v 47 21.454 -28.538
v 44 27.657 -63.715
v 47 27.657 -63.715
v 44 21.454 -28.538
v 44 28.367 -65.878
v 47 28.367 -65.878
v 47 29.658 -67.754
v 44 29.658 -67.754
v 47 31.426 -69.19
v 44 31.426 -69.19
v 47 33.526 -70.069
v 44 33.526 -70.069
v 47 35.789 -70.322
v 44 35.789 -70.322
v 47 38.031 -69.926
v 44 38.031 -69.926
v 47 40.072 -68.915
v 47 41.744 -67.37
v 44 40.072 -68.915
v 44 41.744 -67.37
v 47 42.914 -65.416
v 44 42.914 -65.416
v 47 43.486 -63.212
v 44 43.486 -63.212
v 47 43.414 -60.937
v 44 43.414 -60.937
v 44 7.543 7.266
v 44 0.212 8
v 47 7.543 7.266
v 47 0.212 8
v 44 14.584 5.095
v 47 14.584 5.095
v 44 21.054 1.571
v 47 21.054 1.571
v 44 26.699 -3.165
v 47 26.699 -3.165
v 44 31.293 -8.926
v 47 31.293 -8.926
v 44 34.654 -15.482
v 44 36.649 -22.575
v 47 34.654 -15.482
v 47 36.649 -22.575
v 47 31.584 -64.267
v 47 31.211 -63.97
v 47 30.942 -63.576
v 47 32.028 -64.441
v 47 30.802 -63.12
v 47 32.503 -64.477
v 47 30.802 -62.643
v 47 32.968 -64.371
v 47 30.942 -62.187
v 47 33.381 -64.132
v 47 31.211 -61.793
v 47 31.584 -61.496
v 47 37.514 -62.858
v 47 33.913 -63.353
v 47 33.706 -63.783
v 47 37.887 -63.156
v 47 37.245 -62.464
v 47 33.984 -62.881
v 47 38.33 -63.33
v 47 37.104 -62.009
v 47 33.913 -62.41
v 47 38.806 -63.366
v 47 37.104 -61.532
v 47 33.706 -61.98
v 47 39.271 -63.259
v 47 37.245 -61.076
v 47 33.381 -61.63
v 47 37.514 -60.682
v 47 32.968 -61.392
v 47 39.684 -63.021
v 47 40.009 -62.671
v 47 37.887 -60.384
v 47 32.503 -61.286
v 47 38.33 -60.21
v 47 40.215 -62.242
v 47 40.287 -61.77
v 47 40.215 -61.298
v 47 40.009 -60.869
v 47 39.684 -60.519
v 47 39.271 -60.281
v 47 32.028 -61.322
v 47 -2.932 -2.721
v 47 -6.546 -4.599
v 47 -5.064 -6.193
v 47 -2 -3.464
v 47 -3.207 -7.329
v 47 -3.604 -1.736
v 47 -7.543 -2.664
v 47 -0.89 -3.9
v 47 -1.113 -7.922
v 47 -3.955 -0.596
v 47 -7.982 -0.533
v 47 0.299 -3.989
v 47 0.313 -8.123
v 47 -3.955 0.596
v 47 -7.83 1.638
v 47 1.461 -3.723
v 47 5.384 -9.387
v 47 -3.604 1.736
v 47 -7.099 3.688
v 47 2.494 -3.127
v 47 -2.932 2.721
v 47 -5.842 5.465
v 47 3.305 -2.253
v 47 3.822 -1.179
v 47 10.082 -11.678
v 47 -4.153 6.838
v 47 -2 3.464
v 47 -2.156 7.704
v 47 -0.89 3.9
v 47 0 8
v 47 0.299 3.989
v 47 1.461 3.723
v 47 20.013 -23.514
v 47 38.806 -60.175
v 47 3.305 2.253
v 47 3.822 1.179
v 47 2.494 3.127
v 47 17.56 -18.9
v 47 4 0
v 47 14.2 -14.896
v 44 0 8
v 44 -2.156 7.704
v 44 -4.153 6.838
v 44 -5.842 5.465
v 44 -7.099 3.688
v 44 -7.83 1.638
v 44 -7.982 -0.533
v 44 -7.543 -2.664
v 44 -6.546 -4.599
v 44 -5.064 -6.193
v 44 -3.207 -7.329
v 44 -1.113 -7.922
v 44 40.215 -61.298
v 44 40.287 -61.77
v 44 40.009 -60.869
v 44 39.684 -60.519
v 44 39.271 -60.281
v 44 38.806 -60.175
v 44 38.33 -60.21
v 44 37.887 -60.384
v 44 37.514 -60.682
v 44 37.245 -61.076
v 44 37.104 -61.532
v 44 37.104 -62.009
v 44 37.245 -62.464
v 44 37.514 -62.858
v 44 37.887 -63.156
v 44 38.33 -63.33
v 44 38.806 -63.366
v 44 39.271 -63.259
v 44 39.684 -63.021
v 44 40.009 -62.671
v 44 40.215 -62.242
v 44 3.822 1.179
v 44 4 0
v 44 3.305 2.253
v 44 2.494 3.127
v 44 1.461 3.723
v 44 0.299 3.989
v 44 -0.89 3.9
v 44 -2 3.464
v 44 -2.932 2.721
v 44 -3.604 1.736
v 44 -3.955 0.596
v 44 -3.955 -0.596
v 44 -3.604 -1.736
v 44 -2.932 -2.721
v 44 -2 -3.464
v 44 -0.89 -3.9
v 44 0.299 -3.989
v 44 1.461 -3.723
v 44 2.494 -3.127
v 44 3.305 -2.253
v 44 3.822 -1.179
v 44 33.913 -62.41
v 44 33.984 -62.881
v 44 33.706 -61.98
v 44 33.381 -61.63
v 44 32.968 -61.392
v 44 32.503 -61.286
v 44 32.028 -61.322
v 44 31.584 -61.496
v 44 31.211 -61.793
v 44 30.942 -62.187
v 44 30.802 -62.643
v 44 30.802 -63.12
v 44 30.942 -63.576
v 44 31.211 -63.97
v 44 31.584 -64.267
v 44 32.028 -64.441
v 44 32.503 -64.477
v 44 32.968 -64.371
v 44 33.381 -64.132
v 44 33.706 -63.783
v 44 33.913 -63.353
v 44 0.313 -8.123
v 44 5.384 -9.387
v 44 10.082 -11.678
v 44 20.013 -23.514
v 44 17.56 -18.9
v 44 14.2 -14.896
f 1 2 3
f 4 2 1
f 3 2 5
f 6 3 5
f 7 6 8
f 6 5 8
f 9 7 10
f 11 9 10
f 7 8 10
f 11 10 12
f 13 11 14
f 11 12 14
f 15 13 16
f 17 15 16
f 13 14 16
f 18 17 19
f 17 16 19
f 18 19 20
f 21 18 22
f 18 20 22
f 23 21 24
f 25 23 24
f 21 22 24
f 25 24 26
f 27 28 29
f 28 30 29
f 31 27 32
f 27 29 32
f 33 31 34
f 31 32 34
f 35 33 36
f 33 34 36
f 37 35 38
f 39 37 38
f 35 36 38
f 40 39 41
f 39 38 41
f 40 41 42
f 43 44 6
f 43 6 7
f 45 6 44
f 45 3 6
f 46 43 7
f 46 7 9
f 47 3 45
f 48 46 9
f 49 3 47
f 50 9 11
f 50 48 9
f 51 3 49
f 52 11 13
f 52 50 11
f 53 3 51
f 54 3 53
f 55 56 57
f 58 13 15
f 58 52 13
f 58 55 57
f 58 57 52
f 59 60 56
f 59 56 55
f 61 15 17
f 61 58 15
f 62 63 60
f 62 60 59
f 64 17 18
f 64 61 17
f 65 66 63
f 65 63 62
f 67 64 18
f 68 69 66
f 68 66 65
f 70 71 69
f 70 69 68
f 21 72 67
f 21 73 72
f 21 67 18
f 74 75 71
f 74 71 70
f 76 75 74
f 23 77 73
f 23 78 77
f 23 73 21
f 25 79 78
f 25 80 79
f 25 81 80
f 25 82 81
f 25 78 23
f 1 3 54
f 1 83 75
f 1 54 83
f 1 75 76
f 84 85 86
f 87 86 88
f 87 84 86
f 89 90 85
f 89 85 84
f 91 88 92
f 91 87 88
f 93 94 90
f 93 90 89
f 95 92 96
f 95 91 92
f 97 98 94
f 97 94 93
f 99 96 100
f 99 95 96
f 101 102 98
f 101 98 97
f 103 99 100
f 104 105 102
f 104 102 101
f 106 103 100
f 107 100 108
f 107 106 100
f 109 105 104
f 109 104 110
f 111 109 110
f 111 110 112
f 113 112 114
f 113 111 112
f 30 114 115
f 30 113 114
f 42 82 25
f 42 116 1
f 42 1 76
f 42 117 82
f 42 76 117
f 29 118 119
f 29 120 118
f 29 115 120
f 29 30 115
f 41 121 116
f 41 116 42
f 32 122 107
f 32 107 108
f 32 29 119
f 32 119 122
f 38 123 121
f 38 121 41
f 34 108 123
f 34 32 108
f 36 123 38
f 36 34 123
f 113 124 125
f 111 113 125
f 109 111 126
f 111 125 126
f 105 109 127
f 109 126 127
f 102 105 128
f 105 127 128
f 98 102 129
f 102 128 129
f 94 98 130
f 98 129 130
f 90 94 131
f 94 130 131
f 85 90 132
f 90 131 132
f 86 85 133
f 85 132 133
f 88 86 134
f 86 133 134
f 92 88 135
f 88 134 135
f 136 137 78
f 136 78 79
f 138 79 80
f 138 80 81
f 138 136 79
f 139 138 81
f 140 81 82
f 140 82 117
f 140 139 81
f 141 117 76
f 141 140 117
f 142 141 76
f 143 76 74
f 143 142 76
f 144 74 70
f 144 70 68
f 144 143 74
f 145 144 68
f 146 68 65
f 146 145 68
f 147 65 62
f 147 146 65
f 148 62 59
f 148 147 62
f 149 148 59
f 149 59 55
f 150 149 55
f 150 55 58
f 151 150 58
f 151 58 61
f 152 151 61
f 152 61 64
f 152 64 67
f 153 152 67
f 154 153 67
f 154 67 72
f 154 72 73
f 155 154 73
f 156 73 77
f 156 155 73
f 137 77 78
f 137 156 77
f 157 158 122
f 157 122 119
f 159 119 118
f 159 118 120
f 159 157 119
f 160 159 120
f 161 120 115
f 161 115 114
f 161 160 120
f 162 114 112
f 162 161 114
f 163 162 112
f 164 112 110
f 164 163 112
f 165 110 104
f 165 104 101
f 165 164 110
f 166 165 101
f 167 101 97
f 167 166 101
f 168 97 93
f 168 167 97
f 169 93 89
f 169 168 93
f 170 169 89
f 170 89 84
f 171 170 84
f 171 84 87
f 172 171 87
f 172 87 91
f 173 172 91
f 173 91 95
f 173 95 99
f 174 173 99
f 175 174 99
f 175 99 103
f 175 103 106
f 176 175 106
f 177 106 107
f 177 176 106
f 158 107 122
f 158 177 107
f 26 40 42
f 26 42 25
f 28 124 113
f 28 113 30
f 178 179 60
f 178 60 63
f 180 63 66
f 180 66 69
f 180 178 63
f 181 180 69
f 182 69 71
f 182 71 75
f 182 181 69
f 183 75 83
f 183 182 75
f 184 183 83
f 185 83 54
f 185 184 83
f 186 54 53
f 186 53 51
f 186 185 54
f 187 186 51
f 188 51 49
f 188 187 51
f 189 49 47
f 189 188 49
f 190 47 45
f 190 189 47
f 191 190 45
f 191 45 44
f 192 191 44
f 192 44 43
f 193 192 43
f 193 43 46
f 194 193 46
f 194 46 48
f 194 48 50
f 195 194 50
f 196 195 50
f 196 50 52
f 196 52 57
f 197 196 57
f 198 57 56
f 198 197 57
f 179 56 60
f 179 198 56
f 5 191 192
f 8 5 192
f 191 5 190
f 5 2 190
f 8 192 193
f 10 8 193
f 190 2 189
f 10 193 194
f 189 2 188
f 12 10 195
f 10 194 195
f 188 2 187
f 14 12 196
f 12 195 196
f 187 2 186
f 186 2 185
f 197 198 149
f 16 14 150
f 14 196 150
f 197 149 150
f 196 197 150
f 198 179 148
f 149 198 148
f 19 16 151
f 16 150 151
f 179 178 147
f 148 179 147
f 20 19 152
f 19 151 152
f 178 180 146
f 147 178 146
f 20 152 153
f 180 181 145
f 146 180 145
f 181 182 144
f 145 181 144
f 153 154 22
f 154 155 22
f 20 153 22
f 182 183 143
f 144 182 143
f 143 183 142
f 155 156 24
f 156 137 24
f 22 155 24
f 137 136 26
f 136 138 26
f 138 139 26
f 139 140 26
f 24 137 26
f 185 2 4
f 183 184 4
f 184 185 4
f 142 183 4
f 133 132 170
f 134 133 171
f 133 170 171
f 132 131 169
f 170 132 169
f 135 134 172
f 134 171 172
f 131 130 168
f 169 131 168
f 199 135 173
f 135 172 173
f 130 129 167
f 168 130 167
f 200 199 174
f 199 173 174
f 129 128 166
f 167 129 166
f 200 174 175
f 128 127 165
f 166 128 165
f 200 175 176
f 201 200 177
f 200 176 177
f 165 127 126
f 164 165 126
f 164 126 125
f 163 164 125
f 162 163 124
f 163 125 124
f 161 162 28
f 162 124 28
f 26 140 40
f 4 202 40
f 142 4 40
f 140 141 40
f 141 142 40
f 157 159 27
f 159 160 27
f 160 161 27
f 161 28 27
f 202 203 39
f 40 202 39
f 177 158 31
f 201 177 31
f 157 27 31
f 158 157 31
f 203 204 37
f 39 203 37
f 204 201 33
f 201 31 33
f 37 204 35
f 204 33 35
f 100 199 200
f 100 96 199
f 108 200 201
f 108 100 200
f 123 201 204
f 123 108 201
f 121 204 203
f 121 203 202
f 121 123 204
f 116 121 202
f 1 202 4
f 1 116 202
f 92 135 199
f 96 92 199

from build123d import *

# Parameters (mm, degrees)
SKETCH_R    = 4
SKETCH_R_2  = 1.6
PAD_DEPTH   = 3
FILLET_R    = 25
FILLET012_R = 37


with BuildPart() as part:
    # Sketch → Pad (new body)
    with BuildSketch(Plane.YZ):
        with BuildLine():
            ThreePointArc((0, 8), (-7.980512, 0.558052), (-1.113385, -7.922145))
            Line((-1.113385, -7.922145), (18.3, -10.650518))
            Line((27.656685, -63.714914), (18.3, -10.650518))
            ThreePointArc((27.656685, -63.714914), (36.924332, -70.20419), (43.413609, -60.936543))
            Line((31.258236, 8), (43.413609, -60.936543))
            Line((0, 8), (31.258236, 8))
        make_face()
        Circle(SKETCH_R, mode=Mode.SUBTRACT)
        with Locations((32.383762, -62.881402)):
            Circle(SKETCH_R_2, mode=Mode.SUBTRACT)
        with Locations((38.686532, -61.770054)):
            Circle(SKETCH_R_2, mode=Mode.SUBTRACT)
    extrude(amount=PAD_DEPTH)

    # Fillet
    fillet_edges = [part.edges().sort_by_distance(p)[0] for p in [
        (1.5, 18.3, -10.650518),
    ]]
    fillet(fillet_edges, radius=FILLET_R)

    # Fillet012
    fillet012_edges = [part.edges().sort_by_distance(p)[0] for p in [
        (1.5, 31.258236, 8),
    ]]
    fillet(fillet012_edges, radius=FILLET012_R)


with BuildPart() as part_1:
    # Body placement: moved
    add(part.part.moved(Location((44, 0, 0))))


solid = part_1.part
